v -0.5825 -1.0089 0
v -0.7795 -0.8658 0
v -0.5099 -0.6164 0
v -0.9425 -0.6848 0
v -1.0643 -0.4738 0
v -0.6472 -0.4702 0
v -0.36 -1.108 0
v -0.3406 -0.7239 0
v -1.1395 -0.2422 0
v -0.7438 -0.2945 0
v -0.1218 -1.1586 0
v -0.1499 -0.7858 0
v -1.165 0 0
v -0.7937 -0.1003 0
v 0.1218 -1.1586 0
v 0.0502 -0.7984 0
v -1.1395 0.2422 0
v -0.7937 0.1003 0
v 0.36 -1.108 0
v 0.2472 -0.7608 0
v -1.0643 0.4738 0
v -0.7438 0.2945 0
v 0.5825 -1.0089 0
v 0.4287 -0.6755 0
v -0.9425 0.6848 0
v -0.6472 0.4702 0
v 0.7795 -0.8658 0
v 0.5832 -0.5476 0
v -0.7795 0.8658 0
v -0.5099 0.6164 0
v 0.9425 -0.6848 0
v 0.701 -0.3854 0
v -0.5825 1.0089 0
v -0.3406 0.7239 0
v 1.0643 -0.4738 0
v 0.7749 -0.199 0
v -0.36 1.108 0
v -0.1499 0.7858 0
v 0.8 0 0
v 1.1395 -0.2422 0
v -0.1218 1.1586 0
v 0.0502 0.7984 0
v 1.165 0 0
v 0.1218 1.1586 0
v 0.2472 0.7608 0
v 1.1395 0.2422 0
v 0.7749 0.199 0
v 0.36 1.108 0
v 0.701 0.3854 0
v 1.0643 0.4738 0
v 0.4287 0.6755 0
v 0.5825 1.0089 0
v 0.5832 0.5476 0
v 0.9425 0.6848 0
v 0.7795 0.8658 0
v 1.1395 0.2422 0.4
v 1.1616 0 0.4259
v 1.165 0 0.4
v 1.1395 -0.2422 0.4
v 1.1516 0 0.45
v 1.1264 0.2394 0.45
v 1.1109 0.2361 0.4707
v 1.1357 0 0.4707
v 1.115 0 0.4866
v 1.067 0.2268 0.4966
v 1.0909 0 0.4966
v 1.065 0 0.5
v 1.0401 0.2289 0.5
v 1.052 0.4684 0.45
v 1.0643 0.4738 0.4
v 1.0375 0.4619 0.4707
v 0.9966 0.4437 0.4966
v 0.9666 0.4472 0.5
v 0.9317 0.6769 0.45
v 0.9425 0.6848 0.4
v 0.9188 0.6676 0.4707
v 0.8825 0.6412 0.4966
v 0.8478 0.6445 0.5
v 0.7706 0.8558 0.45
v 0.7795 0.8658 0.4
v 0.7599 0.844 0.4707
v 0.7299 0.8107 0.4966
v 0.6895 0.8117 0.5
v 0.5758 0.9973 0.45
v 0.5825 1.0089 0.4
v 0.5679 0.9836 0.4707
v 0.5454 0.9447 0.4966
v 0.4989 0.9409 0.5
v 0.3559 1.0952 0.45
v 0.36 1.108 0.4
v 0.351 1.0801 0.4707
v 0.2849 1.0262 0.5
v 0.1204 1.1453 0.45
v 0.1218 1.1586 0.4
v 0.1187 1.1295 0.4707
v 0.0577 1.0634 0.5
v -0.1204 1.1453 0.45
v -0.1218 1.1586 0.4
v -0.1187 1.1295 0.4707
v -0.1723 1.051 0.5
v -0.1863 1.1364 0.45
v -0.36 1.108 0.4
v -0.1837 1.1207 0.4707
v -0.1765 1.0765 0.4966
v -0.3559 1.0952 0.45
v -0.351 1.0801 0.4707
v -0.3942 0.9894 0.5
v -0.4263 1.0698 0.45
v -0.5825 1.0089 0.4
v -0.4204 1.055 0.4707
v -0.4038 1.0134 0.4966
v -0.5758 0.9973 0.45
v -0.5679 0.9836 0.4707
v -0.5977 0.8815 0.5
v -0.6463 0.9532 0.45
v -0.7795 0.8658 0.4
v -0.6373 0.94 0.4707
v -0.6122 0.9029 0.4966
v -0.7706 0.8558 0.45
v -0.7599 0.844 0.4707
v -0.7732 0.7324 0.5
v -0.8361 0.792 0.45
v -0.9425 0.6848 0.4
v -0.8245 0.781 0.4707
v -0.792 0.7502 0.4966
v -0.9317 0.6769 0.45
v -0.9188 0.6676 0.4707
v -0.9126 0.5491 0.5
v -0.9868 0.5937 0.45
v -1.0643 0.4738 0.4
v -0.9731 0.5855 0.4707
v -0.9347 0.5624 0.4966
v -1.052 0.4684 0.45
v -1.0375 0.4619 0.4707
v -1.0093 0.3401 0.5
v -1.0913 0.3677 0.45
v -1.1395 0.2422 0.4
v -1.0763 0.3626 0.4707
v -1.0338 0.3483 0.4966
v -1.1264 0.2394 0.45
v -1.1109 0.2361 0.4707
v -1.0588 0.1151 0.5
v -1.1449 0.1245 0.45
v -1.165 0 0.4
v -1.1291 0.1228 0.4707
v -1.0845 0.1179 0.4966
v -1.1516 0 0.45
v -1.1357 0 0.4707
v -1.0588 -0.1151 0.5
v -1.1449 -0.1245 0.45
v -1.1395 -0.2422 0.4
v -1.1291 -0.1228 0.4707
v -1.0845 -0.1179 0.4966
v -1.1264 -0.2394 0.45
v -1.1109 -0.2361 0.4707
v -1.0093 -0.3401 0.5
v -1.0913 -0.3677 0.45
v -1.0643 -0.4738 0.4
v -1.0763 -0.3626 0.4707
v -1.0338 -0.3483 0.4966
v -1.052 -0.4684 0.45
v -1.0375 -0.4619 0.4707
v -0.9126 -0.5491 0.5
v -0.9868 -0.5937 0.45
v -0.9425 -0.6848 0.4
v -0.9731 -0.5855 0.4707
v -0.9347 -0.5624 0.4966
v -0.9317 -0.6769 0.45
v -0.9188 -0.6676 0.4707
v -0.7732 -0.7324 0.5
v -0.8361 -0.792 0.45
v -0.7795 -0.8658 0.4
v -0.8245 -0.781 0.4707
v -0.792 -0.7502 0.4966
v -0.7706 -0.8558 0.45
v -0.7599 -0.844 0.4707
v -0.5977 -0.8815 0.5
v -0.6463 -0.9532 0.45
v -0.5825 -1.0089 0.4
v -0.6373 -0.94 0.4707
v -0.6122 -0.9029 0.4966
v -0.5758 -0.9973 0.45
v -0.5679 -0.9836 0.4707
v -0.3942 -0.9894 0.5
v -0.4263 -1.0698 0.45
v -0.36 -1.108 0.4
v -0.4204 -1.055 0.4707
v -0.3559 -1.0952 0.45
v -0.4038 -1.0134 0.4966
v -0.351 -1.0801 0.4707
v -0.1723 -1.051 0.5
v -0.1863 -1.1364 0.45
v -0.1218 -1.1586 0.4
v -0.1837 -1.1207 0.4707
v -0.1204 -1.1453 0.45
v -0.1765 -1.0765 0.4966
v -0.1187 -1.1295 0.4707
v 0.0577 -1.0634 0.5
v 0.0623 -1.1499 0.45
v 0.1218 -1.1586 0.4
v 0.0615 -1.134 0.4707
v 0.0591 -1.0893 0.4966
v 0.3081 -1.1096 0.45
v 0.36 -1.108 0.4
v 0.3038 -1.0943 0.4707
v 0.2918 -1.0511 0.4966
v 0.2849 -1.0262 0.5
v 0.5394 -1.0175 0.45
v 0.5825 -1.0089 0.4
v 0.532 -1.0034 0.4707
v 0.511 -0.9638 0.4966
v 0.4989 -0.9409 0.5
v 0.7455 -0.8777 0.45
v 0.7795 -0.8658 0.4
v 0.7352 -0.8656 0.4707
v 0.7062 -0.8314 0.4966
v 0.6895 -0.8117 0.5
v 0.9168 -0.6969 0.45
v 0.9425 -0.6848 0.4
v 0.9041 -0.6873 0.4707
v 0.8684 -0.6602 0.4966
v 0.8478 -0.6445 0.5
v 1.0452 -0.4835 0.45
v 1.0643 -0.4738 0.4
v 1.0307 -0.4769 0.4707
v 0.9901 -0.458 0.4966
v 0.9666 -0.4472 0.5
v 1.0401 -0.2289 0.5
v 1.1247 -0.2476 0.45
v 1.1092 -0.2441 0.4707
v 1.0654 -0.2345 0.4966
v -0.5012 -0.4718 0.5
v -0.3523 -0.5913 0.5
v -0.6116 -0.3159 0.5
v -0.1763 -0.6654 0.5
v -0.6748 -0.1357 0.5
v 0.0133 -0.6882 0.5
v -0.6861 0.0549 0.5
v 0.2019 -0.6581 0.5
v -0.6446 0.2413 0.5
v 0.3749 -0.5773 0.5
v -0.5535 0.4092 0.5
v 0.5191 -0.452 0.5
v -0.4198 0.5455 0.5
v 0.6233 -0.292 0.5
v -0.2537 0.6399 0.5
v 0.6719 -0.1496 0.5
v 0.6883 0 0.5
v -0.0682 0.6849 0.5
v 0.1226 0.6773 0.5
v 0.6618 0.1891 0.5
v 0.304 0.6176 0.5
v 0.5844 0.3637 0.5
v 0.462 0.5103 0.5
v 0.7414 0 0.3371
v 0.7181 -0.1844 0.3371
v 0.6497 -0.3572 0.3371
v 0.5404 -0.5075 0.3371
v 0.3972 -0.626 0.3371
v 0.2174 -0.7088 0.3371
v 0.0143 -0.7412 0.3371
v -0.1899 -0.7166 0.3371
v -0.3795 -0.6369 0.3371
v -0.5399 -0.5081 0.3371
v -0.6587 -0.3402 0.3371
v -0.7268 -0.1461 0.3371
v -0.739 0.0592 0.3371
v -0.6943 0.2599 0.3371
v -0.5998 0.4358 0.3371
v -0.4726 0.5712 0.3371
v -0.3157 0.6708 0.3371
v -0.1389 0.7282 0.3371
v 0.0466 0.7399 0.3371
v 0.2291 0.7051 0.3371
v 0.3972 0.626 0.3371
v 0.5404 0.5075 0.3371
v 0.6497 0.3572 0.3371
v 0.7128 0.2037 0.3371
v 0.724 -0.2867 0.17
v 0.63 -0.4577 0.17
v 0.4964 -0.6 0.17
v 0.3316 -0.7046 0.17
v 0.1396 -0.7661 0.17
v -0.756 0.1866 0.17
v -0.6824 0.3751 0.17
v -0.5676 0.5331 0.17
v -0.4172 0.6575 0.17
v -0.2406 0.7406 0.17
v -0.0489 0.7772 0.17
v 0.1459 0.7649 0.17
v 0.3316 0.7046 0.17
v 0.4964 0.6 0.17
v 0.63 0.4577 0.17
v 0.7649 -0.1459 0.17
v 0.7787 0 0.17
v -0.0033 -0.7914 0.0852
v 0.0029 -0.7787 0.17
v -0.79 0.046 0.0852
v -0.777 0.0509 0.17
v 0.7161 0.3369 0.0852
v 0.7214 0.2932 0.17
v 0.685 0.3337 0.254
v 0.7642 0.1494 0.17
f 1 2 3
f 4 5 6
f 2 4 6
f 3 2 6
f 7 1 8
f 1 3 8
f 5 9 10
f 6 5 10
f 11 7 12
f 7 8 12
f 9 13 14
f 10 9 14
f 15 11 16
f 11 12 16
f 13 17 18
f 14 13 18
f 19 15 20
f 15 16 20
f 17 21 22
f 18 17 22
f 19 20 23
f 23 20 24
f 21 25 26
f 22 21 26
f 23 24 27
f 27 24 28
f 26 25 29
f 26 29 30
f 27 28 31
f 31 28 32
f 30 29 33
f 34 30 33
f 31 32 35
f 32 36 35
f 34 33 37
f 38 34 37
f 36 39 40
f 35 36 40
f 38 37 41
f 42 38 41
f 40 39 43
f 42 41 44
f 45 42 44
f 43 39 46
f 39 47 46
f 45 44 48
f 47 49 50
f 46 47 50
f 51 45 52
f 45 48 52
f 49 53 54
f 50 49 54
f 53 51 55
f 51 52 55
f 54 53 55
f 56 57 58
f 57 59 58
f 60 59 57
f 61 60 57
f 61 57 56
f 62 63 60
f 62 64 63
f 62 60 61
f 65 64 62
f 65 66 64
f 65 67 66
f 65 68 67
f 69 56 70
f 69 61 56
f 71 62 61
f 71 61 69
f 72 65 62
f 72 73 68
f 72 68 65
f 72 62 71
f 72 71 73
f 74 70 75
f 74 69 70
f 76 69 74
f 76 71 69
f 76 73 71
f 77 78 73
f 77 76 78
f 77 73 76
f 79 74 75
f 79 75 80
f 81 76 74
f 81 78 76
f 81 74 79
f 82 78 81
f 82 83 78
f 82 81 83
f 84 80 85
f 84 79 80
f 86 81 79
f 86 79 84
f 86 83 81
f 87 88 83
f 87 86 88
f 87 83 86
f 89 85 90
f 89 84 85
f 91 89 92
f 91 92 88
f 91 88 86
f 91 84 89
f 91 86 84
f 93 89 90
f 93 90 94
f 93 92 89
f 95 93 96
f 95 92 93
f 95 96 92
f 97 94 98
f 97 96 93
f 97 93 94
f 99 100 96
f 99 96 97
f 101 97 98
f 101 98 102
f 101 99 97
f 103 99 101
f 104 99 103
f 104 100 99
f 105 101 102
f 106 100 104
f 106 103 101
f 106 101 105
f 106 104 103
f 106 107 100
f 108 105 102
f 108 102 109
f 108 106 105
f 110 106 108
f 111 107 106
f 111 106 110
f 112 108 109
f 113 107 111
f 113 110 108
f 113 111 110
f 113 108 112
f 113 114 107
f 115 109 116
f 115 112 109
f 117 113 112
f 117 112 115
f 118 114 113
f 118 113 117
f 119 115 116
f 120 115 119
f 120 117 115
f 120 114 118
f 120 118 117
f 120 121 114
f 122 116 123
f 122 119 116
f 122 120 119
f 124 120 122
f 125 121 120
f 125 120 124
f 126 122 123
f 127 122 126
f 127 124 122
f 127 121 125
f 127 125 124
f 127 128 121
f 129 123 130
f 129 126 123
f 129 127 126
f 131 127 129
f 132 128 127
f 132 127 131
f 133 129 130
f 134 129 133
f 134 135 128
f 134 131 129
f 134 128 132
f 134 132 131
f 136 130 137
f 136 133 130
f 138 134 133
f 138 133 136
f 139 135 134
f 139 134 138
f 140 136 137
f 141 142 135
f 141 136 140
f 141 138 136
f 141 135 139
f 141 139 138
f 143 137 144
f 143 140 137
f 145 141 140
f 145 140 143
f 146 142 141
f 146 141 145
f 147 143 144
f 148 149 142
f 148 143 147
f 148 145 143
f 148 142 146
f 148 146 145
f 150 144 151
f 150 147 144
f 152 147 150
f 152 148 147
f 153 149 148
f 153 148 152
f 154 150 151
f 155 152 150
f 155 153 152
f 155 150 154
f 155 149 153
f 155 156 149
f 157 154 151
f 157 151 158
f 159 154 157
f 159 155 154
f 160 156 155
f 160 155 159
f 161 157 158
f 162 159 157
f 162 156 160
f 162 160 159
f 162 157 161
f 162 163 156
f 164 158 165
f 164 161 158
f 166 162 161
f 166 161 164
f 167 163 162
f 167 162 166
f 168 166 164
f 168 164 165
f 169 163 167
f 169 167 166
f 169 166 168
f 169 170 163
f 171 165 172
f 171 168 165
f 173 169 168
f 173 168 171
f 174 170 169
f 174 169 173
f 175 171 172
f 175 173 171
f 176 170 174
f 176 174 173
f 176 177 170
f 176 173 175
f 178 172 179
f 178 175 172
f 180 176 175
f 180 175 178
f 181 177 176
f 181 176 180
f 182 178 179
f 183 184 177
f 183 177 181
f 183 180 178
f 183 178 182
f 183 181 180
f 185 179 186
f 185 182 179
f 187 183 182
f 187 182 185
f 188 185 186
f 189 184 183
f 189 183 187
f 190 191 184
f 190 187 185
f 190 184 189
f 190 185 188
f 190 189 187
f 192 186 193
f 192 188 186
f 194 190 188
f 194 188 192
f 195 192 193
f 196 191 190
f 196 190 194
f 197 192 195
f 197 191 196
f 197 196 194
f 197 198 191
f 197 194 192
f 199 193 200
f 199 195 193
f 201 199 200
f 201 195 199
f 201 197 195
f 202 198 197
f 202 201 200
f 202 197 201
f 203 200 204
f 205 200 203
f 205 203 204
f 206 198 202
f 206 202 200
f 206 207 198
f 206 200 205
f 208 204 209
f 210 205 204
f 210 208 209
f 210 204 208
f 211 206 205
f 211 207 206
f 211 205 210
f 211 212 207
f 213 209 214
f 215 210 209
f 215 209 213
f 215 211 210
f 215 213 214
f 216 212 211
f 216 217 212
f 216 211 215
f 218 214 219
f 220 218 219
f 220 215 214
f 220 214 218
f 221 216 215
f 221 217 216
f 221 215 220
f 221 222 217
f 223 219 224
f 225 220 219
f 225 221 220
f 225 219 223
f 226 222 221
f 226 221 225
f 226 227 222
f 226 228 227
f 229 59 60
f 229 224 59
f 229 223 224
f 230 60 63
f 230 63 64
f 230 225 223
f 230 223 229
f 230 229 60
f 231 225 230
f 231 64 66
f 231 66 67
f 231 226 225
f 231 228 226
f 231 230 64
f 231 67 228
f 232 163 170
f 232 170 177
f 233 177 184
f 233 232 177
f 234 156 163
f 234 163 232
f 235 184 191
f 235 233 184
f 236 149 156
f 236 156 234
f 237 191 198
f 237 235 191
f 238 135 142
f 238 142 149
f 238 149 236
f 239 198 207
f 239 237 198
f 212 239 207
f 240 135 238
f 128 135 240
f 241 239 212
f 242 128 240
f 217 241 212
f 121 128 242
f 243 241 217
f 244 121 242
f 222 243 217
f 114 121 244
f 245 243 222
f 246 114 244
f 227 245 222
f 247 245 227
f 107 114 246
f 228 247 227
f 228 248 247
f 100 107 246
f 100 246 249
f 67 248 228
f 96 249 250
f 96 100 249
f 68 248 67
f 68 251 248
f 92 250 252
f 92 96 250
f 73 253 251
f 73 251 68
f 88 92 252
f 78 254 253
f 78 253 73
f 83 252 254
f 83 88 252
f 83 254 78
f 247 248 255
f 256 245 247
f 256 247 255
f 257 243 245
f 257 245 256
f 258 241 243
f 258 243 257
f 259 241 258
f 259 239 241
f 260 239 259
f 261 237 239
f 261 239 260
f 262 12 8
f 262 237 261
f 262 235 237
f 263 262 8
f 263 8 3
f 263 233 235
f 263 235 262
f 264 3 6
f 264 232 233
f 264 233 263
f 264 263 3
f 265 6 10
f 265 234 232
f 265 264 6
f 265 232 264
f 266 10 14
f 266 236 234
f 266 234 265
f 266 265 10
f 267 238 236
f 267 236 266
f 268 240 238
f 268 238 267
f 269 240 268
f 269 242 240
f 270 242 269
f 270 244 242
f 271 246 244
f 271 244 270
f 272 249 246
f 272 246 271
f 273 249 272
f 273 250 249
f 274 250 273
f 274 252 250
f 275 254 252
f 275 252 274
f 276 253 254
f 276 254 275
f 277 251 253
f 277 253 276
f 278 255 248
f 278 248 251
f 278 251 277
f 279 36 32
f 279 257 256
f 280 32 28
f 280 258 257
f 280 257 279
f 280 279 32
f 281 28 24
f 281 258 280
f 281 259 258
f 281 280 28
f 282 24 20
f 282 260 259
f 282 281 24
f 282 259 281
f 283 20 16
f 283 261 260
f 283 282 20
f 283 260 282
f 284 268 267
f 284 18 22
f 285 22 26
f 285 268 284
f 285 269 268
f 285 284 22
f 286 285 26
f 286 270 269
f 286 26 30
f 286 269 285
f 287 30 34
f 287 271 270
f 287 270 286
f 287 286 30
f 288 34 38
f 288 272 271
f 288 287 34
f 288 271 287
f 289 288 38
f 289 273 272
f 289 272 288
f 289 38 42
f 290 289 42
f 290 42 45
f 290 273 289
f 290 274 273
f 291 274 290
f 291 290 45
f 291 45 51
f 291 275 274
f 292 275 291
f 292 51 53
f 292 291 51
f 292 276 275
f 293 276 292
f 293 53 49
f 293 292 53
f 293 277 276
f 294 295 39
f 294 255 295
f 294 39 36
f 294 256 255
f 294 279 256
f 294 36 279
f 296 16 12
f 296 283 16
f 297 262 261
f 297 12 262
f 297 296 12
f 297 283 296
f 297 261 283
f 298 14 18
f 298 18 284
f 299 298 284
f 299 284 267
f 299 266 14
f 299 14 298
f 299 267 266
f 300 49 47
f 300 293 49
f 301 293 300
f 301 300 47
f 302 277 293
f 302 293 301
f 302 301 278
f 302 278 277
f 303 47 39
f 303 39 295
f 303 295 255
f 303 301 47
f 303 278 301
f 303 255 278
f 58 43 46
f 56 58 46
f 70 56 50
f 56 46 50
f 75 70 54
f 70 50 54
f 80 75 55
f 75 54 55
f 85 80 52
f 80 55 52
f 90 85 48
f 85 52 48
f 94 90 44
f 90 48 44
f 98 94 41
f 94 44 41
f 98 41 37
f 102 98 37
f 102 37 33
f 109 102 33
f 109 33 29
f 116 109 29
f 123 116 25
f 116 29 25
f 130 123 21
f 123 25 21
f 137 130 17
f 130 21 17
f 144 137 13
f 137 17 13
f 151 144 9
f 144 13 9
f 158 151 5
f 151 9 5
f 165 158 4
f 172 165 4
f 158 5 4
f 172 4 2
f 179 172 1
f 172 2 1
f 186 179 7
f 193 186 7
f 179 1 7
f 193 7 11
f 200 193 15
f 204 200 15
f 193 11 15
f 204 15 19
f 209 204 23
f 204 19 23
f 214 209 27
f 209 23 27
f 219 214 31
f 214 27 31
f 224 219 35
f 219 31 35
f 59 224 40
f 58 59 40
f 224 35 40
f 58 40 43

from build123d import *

# Parameters (mm, degrees)
F0_R     = 1.165
F2_DEPTH = 0.5
F4_R     = 0.1


with BuildPart() as f2:
    # F0 (on Top) → F2 (new body)
    with BuildSketch(Plane.XY):
        Circle(F0_R)
    extrude(amount=F2_DEPTH)

    # F1 (on Front) → F3 (revolve, cut)
    with BuildSketch(Plane.XZ):
        with BuildLine():
            Line((0.339578, 1), (0, 1))
            Line((0, 1), (0, 0))
            Line((0, 0), (0.8, 0))
            ThreePointArc((0.8, 0), (0.6878, 0.501397), (0.438715, 0.950779))
            ThreePointArc((0.438715, 0.950779), (0.39492, 0.987017), (0.339578, 1))
        make_face()
    revolve(axis=Axis((0, 0, 0.720749), (0, 0, -1)), mode=Mode.SUBTRACT)

    # F4
    f4_edges = [f2.edges().sort_by_distance(p)[0] for p in [
        (-1.165, 0, 0.5),
    ]]
    fillet(f4_edges, radius=F4_R)


solid = f2.part
